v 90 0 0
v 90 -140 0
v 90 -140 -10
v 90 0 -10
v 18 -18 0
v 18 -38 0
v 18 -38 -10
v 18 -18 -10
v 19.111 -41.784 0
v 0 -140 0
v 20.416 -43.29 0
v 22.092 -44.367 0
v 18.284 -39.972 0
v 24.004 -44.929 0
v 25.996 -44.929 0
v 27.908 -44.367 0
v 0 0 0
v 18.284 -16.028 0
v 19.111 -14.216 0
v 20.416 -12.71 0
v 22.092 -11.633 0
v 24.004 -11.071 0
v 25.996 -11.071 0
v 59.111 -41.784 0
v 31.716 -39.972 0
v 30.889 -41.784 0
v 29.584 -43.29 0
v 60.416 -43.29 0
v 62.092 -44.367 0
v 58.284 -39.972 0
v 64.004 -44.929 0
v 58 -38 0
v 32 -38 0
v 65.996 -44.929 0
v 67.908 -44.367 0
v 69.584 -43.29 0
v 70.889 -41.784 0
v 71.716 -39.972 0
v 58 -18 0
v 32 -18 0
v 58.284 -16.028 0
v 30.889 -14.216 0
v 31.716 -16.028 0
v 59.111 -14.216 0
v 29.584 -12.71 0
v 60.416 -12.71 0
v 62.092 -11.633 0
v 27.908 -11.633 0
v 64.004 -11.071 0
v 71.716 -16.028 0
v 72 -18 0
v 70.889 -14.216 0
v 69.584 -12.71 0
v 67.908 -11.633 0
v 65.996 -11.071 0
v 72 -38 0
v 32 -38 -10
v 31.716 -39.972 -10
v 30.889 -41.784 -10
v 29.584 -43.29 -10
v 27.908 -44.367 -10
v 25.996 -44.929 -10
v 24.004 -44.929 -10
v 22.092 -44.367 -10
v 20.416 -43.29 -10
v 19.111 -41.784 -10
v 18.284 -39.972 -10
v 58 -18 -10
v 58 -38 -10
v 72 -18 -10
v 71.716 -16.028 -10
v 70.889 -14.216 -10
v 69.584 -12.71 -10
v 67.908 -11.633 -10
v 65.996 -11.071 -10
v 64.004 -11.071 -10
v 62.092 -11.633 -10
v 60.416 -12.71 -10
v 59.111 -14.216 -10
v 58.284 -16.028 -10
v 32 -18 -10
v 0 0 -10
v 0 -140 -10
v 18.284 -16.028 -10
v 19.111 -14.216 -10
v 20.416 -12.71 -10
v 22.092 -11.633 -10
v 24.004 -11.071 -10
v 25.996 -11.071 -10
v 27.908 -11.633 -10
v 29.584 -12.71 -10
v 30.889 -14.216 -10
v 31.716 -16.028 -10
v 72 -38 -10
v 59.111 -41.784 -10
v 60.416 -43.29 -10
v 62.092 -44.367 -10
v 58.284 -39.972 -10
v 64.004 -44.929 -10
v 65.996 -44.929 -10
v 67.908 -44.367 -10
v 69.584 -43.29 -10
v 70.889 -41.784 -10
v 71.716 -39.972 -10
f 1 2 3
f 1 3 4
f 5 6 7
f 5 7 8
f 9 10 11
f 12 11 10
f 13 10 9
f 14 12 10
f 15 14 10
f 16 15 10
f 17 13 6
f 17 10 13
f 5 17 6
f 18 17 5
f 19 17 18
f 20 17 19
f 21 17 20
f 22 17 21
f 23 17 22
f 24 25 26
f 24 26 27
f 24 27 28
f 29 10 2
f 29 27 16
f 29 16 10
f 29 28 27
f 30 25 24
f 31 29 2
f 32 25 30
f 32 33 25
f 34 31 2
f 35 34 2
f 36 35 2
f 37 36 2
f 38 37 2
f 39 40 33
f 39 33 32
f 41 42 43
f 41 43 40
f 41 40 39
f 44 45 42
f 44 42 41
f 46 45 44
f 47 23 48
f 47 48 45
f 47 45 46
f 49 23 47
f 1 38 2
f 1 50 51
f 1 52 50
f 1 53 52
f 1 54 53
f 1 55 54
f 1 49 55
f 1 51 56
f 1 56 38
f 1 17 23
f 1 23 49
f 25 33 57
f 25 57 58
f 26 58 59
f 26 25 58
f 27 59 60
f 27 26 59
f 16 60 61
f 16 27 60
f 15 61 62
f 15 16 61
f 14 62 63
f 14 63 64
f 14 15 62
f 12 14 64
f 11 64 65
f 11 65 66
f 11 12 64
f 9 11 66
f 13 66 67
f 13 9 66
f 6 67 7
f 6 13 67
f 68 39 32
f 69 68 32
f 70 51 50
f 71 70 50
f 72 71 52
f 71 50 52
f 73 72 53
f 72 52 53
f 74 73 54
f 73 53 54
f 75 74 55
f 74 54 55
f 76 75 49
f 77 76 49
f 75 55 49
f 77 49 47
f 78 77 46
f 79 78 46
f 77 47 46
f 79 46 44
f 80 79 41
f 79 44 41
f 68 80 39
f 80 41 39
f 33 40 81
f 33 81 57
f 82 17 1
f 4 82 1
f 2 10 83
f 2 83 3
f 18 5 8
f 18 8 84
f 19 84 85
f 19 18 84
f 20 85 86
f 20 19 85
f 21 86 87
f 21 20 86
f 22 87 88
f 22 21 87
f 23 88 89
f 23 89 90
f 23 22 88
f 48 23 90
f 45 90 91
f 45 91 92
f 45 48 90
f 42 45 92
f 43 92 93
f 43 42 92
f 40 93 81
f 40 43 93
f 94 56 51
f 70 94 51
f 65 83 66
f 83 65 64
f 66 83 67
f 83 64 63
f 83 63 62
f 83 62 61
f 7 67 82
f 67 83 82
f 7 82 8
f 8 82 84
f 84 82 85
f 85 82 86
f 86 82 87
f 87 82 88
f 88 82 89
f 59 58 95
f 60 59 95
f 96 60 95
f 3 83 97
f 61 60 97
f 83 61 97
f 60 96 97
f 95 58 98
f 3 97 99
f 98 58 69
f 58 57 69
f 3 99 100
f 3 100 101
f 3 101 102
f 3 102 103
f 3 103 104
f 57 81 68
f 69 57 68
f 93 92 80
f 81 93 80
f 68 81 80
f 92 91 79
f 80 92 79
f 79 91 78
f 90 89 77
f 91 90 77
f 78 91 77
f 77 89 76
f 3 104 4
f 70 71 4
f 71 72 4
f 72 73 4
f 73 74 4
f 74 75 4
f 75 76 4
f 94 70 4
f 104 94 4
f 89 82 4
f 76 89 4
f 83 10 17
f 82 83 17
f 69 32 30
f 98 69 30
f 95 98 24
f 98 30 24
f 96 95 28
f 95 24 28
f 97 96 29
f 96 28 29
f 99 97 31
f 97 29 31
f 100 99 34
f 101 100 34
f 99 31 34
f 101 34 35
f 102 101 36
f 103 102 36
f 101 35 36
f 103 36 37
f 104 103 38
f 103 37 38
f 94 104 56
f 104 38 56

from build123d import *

# Parameters (mm, degrees)
SKETCH_1_W             = 90
SKETCH_1_H             = 140
SM_BASE_FLANGE_1_DEPTH = 10


# Sheet-metal steps are written as plain solids
with BuildPart() as part:
    # Sketch 1 → Базовая кромка1 (new body)
    with BuildSketch(Plane.XY):
        with Locations((45, -70)):
            Rectangle(SKETCH_1_W, SKETCH_1_H)
        with BuildLine():
            Line((32, -18), (32, -38))
            ThreePointArc((32, -38), (25, -45), (18, -38))
            Line((18, -38), (18, -18))
            ThreePointArc((18, -18), (25, -11), (32, -18))
        make_face(mode=Mode.SUBTRACT)
        with BuildLine():
            Line((58, -18), (58, -38))
            ThreePointArc((58, -38), (65, -45), (72, -38))
            Line((72, -38), (72, -18))
            ThreePointArc((72, -18), (65, -11), (58, -18))
        make_face(mode=Mode.SUBTRACT)
    extrude(amount=-SM_BASE_FLANGE_1_DEPTH)


solid = part.part
